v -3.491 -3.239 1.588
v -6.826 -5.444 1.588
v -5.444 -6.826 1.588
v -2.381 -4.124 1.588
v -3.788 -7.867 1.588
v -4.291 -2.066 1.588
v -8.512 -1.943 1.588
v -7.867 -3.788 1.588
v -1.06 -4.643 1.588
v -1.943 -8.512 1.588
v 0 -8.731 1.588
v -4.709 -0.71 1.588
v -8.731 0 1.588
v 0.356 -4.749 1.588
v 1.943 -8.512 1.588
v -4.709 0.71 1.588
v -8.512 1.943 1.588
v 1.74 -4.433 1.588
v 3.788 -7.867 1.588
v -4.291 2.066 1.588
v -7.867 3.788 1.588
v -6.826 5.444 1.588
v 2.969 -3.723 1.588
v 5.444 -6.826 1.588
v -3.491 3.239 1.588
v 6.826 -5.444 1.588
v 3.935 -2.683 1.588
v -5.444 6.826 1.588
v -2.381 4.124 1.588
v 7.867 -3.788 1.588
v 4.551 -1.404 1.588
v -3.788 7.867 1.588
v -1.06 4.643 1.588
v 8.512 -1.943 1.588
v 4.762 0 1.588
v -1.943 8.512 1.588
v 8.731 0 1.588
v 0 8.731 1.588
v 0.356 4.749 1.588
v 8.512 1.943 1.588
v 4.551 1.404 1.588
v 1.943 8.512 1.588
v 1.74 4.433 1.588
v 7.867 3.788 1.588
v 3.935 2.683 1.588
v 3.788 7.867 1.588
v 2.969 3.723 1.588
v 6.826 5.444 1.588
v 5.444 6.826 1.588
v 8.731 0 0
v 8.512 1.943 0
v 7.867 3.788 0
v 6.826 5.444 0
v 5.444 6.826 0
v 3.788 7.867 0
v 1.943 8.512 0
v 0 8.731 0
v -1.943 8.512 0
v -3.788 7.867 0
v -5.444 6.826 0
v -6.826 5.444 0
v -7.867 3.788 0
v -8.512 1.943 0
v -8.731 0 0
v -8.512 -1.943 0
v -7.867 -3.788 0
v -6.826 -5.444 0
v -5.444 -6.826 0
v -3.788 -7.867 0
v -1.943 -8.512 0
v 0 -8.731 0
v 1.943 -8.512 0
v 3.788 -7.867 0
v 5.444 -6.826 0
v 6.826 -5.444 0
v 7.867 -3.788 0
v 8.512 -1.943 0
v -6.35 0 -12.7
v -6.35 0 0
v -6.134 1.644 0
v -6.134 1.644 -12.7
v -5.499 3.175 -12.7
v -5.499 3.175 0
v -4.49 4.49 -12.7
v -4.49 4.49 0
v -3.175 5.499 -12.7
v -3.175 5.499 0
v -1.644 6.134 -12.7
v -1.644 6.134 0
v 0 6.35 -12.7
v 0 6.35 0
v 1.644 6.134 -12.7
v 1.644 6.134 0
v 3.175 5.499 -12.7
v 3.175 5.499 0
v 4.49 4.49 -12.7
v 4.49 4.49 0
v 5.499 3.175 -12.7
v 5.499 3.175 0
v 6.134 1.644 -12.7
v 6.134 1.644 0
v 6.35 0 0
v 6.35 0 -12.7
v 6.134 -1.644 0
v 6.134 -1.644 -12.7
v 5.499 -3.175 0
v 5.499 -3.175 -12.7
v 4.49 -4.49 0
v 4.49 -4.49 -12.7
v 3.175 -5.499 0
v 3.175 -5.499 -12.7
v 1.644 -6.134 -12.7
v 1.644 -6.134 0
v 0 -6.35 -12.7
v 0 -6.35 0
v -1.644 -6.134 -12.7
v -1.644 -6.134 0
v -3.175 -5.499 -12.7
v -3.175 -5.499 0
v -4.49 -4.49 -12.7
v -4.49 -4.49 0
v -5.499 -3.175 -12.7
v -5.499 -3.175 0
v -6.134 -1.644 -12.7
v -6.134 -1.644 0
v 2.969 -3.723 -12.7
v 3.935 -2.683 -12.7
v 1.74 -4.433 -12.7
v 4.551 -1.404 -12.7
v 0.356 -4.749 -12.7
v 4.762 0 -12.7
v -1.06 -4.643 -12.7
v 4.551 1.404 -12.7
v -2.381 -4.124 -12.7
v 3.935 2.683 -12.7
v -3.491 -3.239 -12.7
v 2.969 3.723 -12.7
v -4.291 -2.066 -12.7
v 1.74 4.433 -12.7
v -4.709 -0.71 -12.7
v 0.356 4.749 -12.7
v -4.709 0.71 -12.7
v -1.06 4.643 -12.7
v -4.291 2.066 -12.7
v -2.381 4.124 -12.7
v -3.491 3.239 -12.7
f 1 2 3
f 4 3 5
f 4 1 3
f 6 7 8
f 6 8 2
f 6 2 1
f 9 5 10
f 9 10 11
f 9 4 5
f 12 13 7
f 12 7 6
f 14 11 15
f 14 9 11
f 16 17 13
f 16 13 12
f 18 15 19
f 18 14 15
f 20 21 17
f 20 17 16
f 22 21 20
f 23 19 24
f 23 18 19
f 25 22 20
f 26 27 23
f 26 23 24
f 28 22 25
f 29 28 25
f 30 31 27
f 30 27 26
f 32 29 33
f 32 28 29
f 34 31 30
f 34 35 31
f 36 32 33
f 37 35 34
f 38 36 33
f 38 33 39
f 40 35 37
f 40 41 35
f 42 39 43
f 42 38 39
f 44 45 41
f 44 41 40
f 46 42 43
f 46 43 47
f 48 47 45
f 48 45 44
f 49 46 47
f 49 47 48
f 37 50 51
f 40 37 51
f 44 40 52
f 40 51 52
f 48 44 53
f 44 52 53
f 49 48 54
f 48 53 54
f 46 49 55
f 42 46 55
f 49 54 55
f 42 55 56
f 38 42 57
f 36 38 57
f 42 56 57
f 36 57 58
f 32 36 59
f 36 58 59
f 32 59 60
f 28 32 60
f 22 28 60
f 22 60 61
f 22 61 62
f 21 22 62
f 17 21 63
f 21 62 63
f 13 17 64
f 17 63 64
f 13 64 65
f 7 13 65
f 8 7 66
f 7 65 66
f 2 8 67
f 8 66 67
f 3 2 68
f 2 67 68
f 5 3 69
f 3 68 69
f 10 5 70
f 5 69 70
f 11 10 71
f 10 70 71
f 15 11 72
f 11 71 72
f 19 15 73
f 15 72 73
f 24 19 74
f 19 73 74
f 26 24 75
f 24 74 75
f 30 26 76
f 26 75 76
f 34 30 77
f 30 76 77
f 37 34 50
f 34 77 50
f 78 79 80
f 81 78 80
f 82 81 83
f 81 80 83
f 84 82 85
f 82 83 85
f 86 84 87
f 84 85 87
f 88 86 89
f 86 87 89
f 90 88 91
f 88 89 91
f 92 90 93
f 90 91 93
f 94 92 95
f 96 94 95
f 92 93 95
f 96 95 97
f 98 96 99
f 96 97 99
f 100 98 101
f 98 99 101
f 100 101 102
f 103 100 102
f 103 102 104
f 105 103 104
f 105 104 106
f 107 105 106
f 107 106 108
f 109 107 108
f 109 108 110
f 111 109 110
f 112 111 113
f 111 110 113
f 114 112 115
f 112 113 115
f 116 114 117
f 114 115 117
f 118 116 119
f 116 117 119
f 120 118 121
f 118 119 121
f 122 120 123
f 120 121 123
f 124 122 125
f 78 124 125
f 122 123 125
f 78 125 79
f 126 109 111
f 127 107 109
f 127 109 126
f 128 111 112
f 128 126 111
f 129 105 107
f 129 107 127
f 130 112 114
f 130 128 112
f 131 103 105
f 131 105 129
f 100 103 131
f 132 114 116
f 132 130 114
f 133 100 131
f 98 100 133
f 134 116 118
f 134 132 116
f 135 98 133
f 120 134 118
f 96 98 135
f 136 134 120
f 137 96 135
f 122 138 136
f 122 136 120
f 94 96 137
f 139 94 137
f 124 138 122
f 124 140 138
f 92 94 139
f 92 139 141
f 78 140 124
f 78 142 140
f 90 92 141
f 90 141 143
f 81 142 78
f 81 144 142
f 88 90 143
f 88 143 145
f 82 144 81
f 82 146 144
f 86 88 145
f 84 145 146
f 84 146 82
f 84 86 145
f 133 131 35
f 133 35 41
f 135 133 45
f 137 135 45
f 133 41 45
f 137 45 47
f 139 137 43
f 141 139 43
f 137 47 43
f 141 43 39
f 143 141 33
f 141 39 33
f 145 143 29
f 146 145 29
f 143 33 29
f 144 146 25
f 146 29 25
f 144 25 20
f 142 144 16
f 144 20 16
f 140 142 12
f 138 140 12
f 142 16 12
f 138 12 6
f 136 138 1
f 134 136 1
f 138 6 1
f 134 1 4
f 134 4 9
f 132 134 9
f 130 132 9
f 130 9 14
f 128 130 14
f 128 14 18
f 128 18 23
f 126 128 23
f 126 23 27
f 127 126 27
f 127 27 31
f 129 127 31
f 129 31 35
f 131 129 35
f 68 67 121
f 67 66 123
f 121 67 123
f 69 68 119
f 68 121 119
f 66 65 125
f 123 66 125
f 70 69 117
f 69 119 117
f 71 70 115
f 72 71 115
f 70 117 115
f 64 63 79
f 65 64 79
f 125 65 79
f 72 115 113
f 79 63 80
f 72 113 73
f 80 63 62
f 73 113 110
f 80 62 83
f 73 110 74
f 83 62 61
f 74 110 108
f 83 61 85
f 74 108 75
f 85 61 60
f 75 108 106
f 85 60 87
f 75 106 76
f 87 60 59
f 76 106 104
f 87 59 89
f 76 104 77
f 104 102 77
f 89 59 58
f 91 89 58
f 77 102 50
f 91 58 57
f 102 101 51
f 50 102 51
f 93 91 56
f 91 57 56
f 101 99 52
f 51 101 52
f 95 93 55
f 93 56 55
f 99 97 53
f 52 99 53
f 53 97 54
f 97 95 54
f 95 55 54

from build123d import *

# Parameters (mm, degrees)
SKETCH1_R           = 8.73125
BOSS_EXTRUDE1_DEPTH = 1.5875
SKETCH2_R           = 6.35
BOSS_EXTRUDE2_DEPTH = 12.7
SKETCH3_R           = 4.7625
CUT_EXTRUDE1_DEPTH  = 15.2875


with BuildPart() as part:
    # Sketch1 → Boss-Extrude1 (new body)
    with BuildSketch(Plane.XY):
        Circle(SKETCH1_R)
    extrude(amount=BOSS_EXTRUDE1_DEPTH)

    # Sketch2 → Boss-Extrude2 (add)
    with BuildSketch(Plane(origin=(0, 0, 0), x_dir=(-1, 0, 0), z_dir=(0, 0, -1))):
        Circle(SKETCH2_R)
    extrude(amount=BOSS_EXTRUDE2_DEPTH)

    # Sketch3 → Cut-Extrude1 (cut, through all)
    with BuildSketch(Plane.XY.offset(1.5875)):
        Circle(SKETCH3_R)
    extrude(amount=-CUT_EXTRUDE1_DEPTH, mode=Mode.SUBTRACT)


solid = part.part
